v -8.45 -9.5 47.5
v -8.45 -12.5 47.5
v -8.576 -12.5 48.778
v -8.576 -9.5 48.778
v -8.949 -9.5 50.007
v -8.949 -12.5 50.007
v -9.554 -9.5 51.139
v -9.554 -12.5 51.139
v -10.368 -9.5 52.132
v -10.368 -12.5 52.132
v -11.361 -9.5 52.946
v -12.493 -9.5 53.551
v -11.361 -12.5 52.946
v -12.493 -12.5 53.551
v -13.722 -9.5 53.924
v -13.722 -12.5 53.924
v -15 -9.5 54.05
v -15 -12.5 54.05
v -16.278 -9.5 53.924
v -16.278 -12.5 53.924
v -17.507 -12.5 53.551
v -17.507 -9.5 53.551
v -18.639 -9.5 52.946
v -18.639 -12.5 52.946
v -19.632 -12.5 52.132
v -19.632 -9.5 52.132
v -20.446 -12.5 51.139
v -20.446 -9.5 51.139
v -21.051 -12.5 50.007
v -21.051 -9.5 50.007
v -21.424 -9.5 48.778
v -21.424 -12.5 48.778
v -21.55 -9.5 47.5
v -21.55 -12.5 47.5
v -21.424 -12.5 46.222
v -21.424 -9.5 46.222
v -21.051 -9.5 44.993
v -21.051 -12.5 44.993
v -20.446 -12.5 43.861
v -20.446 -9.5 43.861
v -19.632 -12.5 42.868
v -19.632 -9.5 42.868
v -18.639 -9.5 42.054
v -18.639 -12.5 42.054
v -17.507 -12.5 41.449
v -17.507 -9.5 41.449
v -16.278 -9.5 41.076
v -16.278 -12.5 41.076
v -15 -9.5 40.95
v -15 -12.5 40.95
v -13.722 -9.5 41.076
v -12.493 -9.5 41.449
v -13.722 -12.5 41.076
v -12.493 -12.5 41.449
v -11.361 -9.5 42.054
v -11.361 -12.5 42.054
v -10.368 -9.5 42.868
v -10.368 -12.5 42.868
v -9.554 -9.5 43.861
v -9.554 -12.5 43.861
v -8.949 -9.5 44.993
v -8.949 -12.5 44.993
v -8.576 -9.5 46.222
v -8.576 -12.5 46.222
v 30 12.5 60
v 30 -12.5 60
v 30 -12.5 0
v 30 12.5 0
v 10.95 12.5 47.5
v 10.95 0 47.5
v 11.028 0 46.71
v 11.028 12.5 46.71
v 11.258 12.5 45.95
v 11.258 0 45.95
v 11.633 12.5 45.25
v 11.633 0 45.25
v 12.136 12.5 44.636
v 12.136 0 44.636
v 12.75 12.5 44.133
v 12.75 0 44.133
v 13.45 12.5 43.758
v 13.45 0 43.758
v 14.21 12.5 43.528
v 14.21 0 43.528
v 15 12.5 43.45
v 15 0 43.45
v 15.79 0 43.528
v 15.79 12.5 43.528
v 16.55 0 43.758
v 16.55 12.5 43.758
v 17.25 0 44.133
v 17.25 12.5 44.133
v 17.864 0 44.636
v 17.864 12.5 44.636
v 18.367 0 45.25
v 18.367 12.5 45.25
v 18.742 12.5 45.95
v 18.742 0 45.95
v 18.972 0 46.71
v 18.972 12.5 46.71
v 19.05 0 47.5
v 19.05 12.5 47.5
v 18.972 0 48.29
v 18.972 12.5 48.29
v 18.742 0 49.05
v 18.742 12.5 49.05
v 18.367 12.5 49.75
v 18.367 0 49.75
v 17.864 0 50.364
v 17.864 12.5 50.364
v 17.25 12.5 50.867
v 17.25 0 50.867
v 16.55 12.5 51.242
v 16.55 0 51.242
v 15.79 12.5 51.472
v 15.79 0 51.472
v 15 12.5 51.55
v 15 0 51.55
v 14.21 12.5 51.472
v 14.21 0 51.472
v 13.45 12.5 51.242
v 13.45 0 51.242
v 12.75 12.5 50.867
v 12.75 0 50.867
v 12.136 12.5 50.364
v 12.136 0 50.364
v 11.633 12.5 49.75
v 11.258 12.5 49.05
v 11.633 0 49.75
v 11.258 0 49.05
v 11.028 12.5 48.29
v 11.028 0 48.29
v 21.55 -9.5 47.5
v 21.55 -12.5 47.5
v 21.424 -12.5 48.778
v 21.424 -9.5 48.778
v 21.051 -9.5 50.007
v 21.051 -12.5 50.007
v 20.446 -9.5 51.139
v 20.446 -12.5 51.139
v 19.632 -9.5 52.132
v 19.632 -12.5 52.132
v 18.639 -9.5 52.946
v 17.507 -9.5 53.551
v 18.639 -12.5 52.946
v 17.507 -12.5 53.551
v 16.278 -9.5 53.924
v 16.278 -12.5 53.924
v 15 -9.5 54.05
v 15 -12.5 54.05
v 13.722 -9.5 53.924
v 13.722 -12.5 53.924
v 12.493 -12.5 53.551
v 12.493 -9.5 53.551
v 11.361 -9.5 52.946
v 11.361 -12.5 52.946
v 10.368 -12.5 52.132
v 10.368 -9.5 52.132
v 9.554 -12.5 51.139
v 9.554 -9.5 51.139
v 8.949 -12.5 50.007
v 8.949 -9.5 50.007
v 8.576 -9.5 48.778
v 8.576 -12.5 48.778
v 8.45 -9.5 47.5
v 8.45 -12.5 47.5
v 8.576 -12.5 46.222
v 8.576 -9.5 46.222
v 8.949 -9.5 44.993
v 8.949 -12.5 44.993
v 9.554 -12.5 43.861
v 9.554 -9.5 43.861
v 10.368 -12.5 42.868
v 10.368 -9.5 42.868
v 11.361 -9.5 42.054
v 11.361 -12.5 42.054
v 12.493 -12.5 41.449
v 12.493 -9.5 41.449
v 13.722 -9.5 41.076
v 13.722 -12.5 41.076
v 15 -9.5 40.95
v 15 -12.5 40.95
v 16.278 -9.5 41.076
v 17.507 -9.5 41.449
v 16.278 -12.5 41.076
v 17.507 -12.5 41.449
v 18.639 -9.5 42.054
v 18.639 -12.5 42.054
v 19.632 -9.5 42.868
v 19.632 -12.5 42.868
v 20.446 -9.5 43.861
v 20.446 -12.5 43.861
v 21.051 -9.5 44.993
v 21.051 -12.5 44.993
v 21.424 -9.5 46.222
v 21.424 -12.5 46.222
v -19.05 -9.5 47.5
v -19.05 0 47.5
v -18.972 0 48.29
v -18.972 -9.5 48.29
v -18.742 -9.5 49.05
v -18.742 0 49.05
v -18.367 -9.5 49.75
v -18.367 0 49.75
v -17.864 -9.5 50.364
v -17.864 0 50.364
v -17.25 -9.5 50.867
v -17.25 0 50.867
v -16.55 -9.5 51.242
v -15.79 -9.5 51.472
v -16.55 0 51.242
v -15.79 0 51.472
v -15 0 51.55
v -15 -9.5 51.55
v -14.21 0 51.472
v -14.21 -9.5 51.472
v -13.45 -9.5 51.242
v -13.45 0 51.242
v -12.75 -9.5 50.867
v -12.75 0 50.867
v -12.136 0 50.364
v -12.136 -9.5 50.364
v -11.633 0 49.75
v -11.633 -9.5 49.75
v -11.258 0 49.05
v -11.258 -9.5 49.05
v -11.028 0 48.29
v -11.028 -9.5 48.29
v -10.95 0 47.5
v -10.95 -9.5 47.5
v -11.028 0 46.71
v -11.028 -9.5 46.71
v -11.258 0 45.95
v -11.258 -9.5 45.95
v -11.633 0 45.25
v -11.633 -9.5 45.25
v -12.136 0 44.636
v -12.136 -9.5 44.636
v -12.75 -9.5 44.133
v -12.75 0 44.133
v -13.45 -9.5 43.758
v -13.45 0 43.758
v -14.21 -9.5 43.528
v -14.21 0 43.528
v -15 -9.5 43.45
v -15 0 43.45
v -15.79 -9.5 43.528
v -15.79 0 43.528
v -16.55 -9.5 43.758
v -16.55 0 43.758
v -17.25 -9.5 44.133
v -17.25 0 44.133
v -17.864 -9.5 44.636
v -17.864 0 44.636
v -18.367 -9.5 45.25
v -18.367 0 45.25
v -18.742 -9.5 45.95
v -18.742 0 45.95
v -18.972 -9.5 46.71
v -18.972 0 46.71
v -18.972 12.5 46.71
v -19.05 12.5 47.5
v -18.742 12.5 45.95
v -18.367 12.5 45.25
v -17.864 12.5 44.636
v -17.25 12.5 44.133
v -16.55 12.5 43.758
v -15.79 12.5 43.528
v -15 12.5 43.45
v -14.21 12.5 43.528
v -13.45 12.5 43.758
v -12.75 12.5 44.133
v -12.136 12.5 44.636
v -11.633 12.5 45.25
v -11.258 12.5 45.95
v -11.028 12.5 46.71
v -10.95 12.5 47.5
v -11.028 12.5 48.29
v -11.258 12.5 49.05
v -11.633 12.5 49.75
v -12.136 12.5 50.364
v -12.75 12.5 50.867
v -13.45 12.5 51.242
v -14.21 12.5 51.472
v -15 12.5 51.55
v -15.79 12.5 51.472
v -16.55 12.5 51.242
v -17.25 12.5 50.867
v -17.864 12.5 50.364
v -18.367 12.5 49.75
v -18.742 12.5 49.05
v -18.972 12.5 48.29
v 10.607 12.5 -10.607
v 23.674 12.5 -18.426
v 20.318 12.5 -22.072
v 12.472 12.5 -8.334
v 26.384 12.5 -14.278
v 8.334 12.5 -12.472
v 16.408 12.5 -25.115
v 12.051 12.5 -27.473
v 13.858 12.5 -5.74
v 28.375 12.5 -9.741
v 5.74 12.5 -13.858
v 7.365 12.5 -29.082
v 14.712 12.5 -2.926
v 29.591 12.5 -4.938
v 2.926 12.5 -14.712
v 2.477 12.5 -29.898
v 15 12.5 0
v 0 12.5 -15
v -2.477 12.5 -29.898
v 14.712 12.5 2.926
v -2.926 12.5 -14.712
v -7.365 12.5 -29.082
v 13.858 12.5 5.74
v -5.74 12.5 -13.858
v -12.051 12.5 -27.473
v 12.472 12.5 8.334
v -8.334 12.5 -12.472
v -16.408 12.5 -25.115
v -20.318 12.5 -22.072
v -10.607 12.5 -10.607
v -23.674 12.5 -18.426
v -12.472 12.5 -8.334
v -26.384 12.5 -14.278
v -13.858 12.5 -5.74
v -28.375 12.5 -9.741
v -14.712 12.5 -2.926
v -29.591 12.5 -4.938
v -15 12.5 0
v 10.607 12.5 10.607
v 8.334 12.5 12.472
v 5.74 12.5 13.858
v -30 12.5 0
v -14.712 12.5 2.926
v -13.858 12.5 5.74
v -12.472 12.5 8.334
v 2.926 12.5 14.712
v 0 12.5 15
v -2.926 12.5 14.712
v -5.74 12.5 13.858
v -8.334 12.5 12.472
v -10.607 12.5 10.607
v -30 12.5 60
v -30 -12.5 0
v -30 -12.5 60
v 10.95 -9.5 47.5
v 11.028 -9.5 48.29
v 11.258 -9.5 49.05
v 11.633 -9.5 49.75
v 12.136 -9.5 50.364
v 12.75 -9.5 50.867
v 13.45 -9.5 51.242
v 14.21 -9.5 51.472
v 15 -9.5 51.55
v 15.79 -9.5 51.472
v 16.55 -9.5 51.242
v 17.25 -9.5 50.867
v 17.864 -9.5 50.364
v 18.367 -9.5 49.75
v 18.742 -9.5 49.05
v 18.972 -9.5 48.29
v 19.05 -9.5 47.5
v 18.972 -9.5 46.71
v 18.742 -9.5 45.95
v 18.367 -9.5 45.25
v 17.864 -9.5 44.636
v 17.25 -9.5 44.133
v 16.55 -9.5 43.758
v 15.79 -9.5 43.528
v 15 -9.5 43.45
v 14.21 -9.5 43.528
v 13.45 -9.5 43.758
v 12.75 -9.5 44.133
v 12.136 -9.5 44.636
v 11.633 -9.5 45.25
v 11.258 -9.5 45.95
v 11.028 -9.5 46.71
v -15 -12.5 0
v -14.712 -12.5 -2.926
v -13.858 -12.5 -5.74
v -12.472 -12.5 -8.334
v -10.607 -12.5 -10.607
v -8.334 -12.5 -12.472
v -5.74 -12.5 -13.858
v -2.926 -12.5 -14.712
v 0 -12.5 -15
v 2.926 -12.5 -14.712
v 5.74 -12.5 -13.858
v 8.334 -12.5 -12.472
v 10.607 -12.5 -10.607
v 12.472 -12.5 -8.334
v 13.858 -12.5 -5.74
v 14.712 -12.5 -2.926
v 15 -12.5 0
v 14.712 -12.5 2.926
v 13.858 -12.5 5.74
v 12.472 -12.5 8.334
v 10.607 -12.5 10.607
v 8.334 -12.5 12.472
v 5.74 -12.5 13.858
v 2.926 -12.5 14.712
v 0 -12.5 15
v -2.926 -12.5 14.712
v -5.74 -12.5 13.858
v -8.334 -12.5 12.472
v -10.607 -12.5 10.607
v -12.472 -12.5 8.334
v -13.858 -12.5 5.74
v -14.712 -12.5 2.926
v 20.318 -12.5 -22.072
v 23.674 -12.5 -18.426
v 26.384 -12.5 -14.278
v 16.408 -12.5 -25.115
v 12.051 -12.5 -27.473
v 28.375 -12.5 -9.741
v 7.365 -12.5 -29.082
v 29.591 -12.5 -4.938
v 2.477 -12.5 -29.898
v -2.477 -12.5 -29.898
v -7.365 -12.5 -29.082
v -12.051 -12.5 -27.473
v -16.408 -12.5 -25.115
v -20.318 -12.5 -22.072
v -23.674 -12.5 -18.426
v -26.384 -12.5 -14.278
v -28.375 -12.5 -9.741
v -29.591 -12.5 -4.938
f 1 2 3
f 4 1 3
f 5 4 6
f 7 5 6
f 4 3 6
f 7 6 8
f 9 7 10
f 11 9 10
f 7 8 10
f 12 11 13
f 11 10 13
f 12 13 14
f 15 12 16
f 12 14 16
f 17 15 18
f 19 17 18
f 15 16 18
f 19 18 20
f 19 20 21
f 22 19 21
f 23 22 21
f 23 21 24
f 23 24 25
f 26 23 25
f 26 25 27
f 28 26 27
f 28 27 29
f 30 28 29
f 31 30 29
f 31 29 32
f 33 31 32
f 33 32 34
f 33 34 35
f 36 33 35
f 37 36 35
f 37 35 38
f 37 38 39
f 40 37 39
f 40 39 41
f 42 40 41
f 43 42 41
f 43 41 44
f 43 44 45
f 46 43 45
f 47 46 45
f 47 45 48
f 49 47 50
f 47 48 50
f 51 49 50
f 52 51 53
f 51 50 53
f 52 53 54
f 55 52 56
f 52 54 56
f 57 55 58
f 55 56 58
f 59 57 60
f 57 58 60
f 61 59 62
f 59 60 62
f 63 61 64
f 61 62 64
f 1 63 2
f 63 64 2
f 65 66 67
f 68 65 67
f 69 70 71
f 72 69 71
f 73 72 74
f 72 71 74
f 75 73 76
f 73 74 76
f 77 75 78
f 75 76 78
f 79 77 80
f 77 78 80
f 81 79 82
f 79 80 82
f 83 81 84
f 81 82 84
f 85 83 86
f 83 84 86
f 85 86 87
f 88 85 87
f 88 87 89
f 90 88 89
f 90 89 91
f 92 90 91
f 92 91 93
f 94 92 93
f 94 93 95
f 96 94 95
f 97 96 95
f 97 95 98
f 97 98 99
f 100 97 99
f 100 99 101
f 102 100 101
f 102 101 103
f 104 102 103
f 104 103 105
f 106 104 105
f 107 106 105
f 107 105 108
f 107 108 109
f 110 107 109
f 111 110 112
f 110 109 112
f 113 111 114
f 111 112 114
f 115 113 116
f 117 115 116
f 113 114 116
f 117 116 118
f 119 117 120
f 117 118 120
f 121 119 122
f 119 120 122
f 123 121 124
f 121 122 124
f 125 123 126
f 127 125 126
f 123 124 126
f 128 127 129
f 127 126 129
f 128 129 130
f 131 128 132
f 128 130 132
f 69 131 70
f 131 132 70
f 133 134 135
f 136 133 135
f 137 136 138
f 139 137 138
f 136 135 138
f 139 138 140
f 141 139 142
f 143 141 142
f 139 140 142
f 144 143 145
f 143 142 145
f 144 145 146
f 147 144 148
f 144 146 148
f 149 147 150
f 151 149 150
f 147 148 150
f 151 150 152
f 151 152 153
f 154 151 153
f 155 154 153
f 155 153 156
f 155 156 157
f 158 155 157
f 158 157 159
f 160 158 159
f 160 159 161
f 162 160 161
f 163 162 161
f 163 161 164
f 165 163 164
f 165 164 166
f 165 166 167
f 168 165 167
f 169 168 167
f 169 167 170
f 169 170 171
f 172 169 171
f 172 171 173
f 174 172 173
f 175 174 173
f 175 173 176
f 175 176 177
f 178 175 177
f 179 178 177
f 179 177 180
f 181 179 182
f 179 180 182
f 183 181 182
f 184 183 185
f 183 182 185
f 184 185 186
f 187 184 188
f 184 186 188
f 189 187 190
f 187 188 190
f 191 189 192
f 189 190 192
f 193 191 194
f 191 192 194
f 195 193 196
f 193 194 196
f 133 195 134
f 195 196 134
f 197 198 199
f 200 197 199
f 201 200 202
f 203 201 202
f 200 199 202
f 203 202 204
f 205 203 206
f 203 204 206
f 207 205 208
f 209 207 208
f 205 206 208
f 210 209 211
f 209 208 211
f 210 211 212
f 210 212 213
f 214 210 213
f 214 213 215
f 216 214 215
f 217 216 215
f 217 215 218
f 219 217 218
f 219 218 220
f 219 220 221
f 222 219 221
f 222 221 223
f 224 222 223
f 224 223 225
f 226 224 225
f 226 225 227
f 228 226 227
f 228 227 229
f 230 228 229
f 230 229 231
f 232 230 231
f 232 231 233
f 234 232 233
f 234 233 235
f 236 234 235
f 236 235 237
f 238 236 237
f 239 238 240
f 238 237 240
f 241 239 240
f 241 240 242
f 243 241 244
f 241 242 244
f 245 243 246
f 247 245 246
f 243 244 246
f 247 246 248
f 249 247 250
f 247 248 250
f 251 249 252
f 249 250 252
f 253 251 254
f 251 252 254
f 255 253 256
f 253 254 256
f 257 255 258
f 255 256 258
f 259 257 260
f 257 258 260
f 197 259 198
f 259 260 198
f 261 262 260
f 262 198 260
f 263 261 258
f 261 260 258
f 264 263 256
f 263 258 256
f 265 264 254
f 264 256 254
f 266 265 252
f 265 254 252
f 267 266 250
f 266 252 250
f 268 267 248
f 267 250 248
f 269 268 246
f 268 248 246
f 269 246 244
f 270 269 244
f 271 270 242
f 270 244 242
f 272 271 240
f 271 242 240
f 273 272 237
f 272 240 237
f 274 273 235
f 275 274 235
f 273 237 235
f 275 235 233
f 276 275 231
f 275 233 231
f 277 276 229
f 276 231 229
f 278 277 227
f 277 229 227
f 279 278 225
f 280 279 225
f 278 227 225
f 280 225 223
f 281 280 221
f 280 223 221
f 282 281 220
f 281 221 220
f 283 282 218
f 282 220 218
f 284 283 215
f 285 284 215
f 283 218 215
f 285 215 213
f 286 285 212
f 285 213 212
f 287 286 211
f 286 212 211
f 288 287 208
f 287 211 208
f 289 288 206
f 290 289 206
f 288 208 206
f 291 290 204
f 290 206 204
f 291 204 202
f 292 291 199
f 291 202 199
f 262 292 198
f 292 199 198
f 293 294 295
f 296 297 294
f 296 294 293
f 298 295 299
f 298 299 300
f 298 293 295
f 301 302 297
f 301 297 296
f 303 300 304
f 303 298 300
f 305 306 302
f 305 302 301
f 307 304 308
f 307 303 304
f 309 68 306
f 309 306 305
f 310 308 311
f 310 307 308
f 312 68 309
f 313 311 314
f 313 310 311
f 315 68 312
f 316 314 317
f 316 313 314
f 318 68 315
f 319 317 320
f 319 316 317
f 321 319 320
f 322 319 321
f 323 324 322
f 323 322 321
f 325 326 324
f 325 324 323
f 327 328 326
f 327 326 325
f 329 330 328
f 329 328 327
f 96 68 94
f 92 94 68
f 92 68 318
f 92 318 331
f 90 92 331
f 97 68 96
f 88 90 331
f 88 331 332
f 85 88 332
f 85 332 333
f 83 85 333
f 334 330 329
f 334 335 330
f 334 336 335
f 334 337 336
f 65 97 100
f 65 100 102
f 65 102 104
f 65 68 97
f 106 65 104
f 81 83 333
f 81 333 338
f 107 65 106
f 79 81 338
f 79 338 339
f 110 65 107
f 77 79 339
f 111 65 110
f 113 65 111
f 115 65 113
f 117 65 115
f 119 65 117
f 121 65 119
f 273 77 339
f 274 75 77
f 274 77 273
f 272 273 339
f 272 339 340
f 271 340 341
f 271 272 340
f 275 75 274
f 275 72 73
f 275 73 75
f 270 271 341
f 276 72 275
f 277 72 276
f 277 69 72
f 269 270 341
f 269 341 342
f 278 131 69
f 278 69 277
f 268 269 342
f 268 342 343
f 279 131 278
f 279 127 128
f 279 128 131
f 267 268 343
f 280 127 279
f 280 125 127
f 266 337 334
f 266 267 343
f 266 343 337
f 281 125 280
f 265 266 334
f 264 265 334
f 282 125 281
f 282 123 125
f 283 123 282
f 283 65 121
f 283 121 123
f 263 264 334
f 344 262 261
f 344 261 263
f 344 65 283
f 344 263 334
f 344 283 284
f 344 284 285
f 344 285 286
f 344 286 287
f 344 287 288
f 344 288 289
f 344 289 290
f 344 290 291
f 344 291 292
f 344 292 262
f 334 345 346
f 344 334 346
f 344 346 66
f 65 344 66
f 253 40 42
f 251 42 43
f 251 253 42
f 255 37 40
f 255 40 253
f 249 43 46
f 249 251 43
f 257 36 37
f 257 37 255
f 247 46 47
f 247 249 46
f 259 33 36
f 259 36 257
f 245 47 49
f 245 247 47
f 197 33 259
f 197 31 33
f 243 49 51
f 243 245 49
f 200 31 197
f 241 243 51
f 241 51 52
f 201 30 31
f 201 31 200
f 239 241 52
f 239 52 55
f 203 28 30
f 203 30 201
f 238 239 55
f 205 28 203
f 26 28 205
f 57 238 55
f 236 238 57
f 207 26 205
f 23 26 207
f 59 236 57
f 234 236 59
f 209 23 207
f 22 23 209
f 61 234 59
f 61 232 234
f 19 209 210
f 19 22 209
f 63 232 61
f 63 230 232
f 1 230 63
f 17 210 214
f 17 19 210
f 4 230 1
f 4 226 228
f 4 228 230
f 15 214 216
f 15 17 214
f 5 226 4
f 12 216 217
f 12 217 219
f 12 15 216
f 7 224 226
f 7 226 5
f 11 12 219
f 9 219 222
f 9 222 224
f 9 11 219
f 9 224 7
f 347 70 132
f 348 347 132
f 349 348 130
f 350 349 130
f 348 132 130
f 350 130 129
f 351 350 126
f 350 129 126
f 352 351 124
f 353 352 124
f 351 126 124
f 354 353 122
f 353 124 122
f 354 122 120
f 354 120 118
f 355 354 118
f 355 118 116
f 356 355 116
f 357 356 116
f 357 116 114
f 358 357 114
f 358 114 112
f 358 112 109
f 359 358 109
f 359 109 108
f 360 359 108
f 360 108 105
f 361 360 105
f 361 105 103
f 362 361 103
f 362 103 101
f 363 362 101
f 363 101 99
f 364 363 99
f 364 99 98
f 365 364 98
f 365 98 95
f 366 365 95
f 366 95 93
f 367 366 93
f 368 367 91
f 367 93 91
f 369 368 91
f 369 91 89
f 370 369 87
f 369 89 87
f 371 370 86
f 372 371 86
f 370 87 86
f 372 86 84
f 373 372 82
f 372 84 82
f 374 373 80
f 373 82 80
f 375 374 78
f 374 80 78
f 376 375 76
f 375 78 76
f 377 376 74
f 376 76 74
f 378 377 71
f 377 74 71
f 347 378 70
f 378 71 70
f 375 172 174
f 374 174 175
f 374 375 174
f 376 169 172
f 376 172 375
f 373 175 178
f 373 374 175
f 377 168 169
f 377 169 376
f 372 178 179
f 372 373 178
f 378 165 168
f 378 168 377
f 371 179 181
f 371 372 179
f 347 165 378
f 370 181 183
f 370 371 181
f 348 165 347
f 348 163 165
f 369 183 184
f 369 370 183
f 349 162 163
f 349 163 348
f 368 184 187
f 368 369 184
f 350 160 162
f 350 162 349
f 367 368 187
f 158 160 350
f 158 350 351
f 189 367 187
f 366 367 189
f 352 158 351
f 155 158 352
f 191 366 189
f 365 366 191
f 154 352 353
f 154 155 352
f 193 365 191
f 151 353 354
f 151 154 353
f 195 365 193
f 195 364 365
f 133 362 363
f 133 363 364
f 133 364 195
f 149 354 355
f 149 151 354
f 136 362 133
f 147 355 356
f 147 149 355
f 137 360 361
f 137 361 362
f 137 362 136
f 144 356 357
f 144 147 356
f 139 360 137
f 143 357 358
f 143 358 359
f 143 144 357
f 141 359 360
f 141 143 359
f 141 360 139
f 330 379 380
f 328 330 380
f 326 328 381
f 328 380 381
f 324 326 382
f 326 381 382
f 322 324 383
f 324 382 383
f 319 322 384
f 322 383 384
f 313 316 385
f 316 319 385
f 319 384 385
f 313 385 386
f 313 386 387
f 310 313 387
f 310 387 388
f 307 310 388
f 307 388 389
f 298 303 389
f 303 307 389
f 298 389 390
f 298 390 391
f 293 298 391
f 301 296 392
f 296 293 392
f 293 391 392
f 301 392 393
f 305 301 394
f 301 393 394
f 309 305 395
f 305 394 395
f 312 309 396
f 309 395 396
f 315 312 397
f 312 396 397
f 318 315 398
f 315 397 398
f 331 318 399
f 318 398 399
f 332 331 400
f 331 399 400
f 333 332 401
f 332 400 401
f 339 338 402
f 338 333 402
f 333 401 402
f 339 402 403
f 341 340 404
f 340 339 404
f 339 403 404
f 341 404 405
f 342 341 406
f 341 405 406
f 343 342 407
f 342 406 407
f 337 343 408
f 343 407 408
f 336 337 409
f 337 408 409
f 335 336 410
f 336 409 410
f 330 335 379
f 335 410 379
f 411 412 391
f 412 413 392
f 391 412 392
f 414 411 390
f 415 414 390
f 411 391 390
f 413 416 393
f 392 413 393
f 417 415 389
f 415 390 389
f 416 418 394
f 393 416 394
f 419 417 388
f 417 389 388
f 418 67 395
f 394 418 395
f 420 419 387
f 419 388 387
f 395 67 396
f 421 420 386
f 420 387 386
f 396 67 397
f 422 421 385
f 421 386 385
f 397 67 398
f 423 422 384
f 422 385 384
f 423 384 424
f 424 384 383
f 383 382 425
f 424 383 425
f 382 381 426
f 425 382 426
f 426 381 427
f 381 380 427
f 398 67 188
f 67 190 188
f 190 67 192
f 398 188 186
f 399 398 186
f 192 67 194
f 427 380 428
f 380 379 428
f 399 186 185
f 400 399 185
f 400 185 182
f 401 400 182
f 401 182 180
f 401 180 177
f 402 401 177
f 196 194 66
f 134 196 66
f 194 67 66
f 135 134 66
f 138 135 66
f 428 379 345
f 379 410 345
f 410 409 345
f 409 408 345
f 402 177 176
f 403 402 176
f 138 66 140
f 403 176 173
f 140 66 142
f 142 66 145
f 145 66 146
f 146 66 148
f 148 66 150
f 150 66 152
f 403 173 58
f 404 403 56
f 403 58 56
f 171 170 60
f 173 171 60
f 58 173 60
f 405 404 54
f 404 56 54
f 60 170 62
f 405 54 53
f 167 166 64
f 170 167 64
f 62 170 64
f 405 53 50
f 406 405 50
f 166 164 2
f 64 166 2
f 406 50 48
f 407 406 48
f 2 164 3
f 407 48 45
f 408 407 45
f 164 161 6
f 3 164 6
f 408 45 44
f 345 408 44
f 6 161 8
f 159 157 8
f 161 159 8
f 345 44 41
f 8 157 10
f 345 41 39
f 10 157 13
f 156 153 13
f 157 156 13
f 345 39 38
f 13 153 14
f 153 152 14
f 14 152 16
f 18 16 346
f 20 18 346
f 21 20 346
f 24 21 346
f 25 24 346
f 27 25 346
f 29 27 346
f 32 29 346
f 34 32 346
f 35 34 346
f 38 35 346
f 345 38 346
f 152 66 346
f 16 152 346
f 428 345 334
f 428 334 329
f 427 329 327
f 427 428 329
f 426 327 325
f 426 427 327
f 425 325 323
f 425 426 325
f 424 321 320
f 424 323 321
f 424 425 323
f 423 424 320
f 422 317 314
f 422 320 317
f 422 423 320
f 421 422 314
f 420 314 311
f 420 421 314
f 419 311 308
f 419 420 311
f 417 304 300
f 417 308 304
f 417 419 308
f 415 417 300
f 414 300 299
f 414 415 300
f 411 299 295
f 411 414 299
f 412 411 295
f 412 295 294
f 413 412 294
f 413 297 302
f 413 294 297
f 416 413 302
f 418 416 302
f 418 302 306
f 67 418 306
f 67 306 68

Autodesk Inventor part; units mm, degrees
ref_plane "YZ Plane" through (0, 0, 0) normal (1, 0, 0) x (0, 1, 0)
ref_plane "XZ Plane" through (0, 0, 0) normal (0, 1, 0) x (-1, 0, 0)
ref_plane "XY Plane" through (0, 0, 0) normal (0, 0, 1) x (1, 0, 0)
sketch "Sketch1" plane through (0, 0, 0) normal (0, 1, 0) x (-1, 0, 0)
  line L0 (30, 60) -> (-30, 60)
  line L1 (-30, 60) -> (-30, 0)
  arc A0 (-30, 0) -> (30, 0) centre (0, 0) ccw
  line L2 (30, 0) -> (30, 60)
  circle A1 centre (0, 0) radius 15
  dimension "d0" = 60
  dimension "d1" = 60
  dimension "d2" = 30
extrude "Extrusion1" add sketch "Sketch1" along normal mid plane 25
sketch "Sketch2" plane through (0, 0, 0) normal (0, 1, 0) x (-1, 0, 0)
  line L0 (-30, 0) -> (-30, 60) construction
  line L1 (-30, 60) -> (30, 60) construction
  line L2 (30, 60) -> (30, 0) construction
  arc A0 (-30, 0) -> (30, 0) centre (0, 0) ccw construction
  circle A1 centre (0, 0) radius 15 construction
  line L3 (30, 60) -> (30, 0) construction
  line L4 (30, 35) -> (-30, 35) construction
  circle A2 centre (15, 47.5) radius 4.05
  line L5 (0, 35) -> (0, 60) construction
  circle A3 centre (-15, 47.5) radius 4.05
  point P0 (0, -30)
  point P1 (0, 47.5)
  dimension "d5" = 65
  dimension "d6" = 8.1
  dimension "d7" = 30
extrude "Extrusion2" cut sketch "Sketch2" along normal through all both and the other way through all
sketch "Sketch3" plane through (0, -12.5, 0) normal (0, -1, 0) x (1, 0, 0)
  circle A0 centre (-15, 47.5) radius 4.05 construction
  circle A1 centre (15, 47.5) radius 4.05 construction
  line L0 (30, 0) -> (30, 60) construction
  line L1 (30, 60) -> (-30, 60) construction
  line L2 (-30, 60) -> (-30, 0) construction
  arc A2 (-30, 0) -> (30, 0) centre (0, 0) ccw construction
  circle A3 centre (0, 0) radius 15 construction
  circle A4 centre (-15, 47.5) radius 6.55
  circle A5 centre (15, 47.5) radius 4.05 projected
  circle A6 centre (15, 47.5) radius 6.55
  dimension "d10" = 13.1
  dimension "d11" = 13.1
extrude "Extrusion3" cut sketch "Sketch3" against normal blind 3 contours A4 | A5 | A6
properties part number "element1_obj4"
